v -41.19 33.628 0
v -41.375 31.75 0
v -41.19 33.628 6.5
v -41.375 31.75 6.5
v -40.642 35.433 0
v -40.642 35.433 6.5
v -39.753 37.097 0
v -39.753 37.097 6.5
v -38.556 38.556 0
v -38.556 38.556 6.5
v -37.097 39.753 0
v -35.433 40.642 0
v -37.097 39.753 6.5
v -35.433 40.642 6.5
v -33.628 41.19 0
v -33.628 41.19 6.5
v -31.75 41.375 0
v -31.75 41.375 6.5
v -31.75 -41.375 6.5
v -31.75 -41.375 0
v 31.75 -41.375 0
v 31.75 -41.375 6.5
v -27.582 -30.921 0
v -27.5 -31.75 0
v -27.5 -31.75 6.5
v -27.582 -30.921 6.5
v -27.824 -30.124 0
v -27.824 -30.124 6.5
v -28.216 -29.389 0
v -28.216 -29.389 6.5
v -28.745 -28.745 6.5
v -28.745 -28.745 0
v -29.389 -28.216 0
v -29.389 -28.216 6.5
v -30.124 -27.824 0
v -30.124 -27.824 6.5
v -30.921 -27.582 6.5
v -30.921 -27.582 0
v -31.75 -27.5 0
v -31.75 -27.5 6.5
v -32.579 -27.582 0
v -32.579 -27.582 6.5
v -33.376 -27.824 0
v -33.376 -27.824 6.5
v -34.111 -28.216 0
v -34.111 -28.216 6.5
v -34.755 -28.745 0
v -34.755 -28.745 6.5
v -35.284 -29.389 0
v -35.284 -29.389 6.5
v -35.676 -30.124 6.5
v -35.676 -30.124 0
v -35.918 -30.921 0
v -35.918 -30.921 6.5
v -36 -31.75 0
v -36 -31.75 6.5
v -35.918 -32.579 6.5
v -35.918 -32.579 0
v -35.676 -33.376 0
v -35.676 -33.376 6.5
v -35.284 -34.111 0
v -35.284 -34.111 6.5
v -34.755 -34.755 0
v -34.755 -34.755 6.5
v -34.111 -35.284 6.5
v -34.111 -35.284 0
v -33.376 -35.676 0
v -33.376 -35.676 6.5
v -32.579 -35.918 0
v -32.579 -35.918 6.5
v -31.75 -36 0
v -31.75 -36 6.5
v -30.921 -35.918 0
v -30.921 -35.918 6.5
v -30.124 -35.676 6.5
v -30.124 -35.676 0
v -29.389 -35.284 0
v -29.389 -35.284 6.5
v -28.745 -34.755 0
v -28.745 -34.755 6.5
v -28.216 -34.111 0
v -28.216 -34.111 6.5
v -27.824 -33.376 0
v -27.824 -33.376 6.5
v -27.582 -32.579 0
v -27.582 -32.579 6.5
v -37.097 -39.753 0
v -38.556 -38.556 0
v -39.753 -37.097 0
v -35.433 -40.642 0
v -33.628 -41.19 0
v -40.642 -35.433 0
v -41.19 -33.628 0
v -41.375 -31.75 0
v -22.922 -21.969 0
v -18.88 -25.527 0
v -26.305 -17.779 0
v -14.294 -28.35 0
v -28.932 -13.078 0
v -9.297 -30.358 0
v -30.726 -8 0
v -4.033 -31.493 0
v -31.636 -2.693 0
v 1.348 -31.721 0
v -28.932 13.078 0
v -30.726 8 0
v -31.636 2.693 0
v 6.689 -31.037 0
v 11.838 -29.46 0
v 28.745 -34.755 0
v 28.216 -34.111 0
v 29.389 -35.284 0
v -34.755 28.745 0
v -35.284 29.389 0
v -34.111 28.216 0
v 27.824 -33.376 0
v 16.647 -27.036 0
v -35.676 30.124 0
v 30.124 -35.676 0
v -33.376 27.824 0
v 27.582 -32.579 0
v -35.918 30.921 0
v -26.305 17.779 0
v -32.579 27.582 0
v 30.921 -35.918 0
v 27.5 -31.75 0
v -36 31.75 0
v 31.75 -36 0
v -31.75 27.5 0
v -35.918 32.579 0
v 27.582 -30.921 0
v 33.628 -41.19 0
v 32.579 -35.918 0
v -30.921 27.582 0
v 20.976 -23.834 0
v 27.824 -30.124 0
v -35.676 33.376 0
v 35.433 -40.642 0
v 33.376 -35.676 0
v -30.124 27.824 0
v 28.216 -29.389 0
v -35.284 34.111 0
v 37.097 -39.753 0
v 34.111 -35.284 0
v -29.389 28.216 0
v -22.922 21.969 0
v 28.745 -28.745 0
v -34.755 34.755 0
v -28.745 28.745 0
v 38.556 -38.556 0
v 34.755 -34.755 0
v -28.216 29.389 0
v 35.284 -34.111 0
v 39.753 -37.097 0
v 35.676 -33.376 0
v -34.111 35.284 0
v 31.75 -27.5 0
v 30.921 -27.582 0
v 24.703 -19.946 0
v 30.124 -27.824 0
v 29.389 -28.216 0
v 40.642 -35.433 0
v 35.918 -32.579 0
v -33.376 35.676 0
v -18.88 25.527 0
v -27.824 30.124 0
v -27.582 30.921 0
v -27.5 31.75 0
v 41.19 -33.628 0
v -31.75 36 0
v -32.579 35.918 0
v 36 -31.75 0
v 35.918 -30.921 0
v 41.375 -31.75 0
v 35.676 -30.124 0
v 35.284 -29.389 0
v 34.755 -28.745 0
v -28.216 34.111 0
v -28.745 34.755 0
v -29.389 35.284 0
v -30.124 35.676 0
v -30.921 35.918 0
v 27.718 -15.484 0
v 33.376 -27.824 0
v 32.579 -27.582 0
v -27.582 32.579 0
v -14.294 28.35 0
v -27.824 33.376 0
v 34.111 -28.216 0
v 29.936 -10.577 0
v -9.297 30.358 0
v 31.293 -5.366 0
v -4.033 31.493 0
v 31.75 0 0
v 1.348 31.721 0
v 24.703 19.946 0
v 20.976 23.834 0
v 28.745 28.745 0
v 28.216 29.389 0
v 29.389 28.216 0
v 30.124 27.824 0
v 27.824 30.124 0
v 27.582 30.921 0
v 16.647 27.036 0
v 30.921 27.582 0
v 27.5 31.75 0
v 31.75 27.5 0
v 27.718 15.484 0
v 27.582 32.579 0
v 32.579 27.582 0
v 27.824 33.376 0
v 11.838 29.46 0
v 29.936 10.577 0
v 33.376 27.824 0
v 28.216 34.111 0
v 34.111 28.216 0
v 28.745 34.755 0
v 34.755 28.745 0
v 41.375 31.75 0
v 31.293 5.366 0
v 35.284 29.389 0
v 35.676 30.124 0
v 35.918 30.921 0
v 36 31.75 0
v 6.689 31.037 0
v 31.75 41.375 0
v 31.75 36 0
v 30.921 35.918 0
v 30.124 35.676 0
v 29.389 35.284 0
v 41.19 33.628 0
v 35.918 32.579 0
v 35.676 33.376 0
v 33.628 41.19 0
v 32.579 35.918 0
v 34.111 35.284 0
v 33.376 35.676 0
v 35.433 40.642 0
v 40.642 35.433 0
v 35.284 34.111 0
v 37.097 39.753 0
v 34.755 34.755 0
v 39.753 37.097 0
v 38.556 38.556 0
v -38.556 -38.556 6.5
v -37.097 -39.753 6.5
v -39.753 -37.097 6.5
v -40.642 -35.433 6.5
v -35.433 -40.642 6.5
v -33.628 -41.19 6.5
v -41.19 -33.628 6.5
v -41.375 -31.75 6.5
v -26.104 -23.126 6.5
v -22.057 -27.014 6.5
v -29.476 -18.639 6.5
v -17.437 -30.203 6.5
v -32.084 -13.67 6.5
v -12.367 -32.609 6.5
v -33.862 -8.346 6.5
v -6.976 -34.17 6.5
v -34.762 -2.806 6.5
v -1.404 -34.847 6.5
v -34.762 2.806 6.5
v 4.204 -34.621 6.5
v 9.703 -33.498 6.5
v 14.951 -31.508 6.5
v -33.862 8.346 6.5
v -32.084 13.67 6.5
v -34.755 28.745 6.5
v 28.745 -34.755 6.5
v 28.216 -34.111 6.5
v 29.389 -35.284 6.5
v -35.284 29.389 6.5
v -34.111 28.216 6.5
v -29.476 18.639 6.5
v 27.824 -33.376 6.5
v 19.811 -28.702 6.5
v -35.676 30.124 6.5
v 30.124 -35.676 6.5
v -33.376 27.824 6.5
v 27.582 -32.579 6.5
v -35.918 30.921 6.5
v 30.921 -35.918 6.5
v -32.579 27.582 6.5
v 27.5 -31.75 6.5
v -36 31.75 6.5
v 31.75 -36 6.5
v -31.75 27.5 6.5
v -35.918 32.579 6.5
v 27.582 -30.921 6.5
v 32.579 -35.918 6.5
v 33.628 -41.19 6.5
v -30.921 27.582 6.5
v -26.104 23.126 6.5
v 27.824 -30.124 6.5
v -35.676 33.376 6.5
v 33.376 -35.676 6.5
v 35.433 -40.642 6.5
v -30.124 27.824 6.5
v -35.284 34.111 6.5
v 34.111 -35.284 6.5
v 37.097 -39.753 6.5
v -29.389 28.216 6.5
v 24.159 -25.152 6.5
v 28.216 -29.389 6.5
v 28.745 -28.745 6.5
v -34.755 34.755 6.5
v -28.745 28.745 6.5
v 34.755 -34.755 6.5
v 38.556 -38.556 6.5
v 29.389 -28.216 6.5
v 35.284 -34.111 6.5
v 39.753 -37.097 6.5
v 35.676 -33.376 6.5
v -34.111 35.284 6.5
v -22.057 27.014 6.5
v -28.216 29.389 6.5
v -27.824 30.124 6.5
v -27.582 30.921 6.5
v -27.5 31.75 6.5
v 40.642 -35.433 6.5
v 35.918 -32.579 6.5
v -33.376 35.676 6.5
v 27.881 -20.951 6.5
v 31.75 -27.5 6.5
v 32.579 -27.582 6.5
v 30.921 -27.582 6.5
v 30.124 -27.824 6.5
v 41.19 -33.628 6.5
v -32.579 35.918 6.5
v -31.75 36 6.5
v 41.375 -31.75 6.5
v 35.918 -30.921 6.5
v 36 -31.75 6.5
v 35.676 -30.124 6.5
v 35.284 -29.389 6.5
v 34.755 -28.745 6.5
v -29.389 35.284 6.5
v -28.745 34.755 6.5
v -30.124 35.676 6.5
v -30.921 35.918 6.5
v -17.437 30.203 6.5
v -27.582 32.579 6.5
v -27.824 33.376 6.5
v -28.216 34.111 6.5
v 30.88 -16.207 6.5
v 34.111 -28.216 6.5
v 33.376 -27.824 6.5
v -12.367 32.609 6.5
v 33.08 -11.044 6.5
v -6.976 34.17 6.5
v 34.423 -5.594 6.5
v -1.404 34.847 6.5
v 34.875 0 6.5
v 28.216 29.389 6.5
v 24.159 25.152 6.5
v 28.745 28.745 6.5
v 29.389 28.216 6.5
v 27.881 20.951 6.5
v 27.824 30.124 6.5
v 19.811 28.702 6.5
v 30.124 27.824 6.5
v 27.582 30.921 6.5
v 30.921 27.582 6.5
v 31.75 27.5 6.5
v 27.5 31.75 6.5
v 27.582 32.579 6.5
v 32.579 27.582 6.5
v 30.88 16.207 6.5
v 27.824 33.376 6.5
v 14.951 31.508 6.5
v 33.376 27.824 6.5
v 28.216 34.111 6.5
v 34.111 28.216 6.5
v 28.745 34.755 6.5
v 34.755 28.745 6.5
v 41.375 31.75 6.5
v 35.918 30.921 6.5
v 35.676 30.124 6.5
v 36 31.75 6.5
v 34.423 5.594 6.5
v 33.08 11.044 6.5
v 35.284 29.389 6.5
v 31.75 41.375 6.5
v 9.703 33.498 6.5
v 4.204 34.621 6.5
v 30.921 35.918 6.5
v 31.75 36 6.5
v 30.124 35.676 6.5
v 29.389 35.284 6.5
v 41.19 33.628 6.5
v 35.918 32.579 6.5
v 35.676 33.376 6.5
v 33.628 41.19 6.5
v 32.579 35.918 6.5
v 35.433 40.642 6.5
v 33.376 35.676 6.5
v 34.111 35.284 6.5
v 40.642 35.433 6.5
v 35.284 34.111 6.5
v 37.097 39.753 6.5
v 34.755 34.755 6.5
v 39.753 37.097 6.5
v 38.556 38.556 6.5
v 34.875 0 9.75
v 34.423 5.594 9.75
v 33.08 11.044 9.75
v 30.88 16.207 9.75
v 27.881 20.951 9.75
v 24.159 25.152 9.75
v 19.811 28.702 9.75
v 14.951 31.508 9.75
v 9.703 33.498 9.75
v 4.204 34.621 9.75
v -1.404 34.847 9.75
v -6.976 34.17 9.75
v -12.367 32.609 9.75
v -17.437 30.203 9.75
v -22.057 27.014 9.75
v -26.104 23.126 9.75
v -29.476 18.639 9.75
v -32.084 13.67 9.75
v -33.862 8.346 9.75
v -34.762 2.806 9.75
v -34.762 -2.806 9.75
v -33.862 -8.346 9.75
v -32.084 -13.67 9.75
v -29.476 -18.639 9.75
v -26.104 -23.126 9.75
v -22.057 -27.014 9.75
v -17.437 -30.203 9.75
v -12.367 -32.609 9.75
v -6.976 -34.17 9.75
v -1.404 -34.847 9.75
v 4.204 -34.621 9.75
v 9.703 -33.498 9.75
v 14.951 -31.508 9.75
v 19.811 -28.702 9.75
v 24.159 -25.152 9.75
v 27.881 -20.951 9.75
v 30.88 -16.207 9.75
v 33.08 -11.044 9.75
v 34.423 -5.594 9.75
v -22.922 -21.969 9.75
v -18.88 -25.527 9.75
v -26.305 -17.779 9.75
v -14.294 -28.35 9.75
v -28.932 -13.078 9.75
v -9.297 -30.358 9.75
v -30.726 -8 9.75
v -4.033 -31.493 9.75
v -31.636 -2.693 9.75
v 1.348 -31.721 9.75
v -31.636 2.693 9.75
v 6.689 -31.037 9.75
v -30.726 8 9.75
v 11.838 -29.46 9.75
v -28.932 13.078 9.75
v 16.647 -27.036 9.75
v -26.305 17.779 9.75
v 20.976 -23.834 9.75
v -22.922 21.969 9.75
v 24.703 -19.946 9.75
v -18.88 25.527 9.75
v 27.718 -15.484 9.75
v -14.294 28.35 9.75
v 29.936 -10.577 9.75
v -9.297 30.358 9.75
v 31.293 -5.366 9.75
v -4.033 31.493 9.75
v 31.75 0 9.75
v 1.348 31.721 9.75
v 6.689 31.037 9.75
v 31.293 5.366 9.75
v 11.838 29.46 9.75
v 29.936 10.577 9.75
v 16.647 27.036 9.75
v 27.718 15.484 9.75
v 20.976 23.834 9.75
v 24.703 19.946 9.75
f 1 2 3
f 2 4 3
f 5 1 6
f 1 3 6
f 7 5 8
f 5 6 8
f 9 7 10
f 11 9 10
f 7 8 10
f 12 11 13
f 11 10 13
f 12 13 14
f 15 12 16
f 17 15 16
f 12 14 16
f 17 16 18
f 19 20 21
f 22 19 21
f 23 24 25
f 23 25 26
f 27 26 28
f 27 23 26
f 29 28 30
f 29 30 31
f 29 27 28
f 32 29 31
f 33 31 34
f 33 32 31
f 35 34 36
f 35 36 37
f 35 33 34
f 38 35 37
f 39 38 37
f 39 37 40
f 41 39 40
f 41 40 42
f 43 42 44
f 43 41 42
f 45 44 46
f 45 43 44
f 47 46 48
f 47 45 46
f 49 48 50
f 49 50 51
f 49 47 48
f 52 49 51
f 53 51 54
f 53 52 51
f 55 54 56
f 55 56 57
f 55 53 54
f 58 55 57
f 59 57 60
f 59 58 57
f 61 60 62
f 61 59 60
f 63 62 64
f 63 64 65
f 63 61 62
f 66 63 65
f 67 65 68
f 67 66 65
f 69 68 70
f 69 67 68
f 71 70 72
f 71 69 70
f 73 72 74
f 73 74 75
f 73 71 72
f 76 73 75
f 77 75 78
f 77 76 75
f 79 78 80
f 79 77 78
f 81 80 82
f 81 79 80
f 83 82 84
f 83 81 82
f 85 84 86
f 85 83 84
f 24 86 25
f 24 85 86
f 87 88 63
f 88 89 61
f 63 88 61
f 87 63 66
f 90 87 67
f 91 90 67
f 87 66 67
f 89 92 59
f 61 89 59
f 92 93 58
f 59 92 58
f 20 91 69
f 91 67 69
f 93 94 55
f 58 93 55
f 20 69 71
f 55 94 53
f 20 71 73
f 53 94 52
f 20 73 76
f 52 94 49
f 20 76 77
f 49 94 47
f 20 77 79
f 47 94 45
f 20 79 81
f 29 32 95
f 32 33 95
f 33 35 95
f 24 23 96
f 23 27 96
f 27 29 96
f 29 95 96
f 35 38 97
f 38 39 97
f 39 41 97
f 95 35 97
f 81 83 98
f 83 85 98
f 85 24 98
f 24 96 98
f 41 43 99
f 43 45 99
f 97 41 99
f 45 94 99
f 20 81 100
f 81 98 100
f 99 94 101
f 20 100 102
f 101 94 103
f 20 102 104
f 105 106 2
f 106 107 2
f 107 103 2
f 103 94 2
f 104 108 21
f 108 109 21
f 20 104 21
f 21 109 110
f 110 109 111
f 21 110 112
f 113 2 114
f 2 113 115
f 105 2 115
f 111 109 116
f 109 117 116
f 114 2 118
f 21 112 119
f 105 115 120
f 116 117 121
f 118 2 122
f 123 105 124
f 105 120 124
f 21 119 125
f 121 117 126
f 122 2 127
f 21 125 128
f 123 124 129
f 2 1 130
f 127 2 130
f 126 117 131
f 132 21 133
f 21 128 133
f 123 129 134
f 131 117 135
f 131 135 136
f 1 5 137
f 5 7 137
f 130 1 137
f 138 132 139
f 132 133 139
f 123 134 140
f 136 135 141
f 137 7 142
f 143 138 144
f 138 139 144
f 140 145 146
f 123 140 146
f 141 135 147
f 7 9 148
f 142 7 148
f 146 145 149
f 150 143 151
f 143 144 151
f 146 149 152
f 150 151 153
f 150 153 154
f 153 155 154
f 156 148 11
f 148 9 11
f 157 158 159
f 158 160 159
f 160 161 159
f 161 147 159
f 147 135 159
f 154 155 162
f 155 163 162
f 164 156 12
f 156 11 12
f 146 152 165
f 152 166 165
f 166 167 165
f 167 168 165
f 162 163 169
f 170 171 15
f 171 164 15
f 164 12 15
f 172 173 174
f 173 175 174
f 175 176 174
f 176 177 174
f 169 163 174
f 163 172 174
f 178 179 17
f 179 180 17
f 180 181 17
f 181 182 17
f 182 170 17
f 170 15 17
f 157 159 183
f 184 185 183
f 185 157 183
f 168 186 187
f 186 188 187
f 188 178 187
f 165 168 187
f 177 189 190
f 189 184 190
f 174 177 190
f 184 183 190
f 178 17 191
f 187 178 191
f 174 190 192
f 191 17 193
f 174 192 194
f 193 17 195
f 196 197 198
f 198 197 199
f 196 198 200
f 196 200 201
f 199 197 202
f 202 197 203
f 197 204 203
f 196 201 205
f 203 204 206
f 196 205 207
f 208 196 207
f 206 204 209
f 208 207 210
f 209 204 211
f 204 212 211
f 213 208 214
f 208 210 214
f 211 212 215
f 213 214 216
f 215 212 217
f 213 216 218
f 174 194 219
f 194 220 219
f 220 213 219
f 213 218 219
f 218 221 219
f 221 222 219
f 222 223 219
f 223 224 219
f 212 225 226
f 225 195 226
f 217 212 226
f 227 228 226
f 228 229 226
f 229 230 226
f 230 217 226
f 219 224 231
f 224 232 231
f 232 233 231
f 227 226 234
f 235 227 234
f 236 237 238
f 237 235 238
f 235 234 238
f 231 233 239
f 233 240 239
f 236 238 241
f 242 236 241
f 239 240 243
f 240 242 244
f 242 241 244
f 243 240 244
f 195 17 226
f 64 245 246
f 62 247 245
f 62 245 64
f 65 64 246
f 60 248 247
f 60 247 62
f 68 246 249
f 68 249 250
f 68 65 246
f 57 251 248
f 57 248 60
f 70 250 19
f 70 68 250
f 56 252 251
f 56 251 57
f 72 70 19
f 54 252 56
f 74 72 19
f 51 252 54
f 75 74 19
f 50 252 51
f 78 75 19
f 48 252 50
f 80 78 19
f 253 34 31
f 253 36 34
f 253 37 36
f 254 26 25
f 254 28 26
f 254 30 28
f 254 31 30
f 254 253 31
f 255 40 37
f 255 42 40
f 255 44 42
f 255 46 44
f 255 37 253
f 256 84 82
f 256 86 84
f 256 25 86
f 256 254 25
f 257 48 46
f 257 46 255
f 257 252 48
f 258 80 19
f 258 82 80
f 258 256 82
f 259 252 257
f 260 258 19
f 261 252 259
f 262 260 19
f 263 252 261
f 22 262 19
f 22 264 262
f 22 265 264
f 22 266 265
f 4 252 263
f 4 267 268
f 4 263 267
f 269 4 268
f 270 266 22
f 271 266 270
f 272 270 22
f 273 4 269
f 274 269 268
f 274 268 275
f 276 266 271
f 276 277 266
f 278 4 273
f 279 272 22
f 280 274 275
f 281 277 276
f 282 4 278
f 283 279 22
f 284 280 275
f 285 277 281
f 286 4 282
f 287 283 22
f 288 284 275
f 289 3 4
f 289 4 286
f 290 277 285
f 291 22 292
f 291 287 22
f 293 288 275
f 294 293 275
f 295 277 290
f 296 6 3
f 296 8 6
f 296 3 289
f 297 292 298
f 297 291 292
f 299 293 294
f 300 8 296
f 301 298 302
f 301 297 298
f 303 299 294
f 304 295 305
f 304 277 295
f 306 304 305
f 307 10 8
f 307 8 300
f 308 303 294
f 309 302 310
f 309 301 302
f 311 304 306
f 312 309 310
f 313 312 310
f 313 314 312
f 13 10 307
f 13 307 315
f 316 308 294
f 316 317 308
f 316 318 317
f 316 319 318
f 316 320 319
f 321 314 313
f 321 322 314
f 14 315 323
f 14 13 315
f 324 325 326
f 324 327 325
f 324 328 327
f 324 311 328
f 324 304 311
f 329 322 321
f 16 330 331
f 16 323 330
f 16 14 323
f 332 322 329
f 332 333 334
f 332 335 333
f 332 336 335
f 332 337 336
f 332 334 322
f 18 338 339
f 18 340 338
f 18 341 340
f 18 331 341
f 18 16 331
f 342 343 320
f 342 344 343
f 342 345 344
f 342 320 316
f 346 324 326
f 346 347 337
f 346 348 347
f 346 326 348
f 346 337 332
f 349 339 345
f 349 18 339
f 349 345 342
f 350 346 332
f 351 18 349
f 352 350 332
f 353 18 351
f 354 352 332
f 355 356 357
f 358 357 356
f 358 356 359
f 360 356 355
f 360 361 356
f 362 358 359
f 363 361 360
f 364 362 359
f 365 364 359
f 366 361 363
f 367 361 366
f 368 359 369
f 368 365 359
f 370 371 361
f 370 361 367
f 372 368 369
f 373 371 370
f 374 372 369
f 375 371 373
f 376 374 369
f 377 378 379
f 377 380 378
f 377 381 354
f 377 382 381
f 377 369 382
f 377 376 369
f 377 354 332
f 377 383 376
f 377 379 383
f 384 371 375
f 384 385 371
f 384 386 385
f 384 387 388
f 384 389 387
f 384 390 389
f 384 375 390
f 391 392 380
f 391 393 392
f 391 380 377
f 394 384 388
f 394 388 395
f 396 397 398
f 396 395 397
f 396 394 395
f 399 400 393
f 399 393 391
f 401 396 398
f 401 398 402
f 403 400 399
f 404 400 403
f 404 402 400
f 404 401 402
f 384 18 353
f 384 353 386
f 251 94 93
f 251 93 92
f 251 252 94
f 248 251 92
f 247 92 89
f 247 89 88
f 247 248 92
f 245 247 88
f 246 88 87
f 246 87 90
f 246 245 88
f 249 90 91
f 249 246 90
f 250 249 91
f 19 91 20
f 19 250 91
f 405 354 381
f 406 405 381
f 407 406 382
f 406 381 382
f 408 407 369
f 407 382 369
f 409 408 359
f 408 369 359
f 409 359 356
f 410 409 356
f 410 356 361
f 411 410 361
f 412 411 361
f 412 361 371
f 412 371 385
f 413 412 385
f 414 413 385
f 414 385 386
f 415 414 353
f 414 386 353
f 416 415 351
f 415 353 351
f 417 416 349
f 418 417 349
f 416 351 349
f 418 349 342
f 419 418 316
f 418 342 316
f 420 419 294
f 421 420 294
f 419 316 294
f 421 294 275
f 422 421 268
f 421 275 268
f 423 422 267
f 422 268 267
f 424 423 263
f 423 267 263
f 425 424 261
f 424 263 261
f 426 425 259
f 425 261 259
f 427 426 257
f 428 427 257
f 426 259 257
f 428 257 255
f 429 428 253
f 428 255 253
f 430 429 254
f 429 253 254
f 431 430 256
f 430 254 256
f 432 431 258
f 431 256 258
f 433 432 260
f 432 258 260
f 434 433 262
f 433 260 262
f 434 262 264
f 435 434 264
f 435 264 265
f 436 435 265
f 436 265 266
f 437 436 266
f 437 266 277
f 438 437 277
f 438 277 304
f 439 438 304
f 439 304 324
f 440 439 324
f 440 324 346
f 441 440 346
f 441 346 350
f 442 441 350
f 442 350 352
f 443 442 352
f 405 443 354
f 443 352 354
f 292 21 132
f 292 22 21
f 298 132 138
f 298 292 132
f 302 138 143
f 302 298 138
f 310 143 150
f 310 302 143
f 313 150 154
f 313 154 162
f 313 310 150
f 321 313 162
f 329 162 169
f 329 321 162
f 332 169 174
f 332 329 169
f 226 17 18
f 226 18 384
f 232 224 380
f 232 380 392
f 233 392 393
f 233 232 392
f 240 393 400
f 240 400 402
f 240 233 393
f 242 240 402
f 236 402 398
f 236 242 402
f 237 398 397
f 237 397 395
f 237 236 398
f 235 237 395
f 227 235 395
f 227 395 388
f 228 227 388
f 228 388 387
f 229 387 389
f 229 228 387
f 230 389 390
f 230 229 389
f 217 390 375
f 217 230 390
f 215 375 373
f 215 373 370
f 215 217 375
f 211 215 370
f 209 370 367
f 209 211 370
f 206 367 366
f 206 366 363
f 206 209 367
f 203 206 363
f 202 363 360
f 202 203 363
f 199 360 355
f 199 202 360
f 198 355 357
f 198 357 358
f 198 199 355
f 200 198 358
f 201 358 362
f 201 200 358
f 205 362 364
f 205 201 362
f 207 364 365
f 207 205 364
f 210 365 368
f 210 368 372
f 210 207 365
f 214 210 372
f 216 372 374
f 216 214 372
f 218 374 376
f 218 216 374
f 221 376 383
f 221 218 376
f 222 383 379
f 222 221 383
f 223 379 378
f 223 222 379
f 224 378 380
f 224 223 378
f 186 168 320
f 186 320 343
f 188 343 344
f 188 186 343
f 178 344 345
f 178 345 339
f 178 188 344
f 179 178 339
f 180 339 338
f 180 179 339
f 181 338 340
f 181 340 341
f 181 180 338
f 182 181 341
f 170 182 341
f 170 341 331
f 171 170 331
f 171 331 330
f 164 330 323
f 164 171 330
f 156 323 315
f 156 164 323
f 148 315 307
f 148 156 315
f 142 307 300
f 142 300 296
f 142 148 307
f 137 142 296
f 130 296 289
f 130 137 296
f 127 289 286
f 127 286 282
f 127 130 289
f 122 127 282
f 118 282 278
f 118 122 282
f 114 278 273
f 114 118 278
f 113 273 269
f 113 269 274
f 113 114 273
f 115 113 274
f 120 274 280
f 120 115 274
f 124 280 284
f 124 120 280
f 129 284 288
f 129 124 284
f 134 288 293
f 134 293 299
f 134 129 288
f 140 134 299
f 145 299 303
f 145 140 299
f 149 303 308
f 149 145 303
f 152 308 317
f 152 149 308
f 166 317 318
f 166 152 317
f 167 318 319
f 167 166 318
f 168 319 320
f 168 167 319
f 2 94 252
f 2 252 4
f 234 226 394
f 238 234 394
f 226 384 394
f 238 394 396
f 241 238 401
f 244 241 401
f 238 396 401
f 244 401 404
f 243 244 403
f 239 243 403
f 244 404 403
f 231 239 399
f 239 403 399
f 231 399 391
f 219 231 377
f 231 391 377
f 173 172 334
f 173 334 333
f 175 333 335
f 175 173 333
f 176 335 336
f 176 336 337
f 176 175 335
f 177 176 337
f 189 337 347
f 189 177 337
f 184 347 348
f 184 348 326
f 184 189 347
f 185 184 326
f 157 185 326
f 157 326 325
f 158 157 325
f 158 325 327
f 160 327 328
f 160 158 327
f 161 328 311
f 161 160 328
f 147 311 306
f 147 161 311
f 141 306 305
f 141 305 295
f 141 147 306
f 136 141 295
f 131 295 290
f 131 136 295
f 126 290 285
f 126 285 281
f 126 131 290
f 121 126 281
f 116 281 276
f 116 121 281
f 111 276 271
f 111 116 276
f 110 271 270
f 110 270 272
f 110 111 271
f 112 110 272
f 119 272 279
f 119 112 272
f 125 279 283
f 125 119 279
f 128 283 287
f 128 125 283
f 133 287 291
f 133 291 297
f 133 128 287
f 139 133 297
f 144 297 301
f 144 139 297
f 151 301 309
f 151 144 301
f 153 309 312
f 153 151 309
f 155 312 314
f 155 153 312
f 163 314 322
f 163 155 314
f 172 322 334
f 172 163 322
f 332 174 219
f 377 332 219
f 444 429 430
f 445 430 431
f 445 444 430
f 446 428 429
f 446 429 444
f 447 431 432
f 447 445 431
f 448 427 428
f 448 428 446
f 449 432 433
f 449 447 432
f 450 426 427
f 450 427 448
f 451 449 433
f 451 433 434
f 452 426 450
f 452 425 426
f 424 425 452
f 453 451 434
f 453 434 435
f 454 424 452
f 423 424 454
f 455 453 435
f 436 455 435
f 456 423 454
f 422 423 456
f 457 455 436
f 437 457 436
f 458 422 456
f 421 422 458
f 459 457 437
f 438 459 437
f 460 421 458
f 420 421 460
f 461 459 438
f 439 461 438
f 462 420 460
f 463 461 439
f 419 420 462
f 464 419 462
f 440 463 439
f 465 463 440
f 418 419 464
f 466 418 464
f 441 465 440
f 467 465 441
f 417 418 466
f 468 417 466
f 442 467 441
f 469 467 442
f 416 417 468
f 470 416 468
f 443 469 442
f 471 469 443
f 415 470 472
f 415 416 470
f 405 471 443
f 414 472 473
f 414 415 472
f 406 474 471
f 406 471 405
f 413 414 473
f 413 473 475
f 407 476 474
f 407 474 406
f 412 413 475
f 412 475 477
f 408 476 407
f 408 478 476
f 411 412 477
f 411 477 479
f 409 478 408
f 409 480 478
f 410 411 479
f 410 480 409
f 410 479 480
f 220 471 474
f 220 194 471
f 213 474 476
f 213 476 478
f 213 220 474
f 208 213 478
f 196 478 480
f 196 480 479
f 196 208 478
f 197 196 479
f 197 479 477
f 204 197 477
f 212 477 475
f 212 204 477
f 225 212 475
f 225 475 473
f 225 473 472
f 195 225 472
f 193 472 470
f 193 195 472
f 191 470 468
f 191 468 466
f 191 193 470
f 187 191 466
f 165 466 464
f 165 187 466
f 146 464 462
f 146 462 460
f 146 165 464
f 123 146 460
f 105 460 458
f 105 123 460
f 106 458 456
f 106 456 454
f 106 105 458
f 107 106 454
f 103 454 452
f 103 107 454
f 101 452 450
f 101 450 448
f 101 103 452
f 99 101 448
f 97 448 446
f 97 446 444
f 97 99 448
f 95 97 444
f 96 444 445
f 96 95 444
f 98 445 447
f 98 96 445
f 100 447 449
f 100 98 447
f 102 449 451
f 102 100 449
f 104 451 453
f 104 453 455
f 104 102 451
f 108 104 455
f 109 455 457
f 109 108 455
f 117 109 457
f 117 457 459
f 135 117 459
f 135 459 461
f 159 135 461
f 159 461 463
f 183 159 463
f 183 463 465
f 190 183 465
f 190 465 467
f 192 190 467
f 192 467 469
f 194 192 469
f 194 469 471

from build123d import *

# Parameters (mm, degrees)
F0_W     = 82.75
F0_H     = 82.75
F0_R     = 4.25
F0_R_2   = 31.75
F1_DEPTH = 6.5
F2_R     = 9.625
F3_R     = 34.875
F3_R_2   = 31.75
F4_DEPTH = 3.25


with BuildPart() as f1:
    # F0 (on Top) → F1 (new body)
    with BuildSketch(Plane.XY):
        Rectangle(F0_W, F0_H)
        with Locations((-31.75, -31.75)):
            Circle(F0_R, mode=Mode.SUBTRACT)
        with Locations((31.75, -31.75)):
            Circle(F0_R, mode=Mode.SUBTRACT)
        with Locations((-31.75, 31.75)):
            Circle(F0_R, mode=Mode.SUBTRACT)
        Circle(F0_R_2, mode=Mode.SUBTRACT)
        with Locations((31.75, 31.75)):
            Circle(F0_R, mode=Mode.SUBTRACT)
    extrude(amount=F1_DEPTH)

    # F2
    f2_edges = [f1.edges().sort_by_distance(p)[0] for p in [
        (-41.375, -41.375, 3.25),
        (-41.375, 41.375, 3.25),
        (41.375, 41.375, 3.25),
        (41.375, -41.375, 3.25),
    ]]
    fillet(f2_edges, radius=F2_R)

    # F3 (on face) → F4 (join)
    with BuildSketch(Plane.XY.offset(6.5)):
        Circle(F3_R)
        Circle(F3_R_2, mode=Mode.SUBTRACT)
    extrude(amount=F4_DEPTH)


solid = f1.part
